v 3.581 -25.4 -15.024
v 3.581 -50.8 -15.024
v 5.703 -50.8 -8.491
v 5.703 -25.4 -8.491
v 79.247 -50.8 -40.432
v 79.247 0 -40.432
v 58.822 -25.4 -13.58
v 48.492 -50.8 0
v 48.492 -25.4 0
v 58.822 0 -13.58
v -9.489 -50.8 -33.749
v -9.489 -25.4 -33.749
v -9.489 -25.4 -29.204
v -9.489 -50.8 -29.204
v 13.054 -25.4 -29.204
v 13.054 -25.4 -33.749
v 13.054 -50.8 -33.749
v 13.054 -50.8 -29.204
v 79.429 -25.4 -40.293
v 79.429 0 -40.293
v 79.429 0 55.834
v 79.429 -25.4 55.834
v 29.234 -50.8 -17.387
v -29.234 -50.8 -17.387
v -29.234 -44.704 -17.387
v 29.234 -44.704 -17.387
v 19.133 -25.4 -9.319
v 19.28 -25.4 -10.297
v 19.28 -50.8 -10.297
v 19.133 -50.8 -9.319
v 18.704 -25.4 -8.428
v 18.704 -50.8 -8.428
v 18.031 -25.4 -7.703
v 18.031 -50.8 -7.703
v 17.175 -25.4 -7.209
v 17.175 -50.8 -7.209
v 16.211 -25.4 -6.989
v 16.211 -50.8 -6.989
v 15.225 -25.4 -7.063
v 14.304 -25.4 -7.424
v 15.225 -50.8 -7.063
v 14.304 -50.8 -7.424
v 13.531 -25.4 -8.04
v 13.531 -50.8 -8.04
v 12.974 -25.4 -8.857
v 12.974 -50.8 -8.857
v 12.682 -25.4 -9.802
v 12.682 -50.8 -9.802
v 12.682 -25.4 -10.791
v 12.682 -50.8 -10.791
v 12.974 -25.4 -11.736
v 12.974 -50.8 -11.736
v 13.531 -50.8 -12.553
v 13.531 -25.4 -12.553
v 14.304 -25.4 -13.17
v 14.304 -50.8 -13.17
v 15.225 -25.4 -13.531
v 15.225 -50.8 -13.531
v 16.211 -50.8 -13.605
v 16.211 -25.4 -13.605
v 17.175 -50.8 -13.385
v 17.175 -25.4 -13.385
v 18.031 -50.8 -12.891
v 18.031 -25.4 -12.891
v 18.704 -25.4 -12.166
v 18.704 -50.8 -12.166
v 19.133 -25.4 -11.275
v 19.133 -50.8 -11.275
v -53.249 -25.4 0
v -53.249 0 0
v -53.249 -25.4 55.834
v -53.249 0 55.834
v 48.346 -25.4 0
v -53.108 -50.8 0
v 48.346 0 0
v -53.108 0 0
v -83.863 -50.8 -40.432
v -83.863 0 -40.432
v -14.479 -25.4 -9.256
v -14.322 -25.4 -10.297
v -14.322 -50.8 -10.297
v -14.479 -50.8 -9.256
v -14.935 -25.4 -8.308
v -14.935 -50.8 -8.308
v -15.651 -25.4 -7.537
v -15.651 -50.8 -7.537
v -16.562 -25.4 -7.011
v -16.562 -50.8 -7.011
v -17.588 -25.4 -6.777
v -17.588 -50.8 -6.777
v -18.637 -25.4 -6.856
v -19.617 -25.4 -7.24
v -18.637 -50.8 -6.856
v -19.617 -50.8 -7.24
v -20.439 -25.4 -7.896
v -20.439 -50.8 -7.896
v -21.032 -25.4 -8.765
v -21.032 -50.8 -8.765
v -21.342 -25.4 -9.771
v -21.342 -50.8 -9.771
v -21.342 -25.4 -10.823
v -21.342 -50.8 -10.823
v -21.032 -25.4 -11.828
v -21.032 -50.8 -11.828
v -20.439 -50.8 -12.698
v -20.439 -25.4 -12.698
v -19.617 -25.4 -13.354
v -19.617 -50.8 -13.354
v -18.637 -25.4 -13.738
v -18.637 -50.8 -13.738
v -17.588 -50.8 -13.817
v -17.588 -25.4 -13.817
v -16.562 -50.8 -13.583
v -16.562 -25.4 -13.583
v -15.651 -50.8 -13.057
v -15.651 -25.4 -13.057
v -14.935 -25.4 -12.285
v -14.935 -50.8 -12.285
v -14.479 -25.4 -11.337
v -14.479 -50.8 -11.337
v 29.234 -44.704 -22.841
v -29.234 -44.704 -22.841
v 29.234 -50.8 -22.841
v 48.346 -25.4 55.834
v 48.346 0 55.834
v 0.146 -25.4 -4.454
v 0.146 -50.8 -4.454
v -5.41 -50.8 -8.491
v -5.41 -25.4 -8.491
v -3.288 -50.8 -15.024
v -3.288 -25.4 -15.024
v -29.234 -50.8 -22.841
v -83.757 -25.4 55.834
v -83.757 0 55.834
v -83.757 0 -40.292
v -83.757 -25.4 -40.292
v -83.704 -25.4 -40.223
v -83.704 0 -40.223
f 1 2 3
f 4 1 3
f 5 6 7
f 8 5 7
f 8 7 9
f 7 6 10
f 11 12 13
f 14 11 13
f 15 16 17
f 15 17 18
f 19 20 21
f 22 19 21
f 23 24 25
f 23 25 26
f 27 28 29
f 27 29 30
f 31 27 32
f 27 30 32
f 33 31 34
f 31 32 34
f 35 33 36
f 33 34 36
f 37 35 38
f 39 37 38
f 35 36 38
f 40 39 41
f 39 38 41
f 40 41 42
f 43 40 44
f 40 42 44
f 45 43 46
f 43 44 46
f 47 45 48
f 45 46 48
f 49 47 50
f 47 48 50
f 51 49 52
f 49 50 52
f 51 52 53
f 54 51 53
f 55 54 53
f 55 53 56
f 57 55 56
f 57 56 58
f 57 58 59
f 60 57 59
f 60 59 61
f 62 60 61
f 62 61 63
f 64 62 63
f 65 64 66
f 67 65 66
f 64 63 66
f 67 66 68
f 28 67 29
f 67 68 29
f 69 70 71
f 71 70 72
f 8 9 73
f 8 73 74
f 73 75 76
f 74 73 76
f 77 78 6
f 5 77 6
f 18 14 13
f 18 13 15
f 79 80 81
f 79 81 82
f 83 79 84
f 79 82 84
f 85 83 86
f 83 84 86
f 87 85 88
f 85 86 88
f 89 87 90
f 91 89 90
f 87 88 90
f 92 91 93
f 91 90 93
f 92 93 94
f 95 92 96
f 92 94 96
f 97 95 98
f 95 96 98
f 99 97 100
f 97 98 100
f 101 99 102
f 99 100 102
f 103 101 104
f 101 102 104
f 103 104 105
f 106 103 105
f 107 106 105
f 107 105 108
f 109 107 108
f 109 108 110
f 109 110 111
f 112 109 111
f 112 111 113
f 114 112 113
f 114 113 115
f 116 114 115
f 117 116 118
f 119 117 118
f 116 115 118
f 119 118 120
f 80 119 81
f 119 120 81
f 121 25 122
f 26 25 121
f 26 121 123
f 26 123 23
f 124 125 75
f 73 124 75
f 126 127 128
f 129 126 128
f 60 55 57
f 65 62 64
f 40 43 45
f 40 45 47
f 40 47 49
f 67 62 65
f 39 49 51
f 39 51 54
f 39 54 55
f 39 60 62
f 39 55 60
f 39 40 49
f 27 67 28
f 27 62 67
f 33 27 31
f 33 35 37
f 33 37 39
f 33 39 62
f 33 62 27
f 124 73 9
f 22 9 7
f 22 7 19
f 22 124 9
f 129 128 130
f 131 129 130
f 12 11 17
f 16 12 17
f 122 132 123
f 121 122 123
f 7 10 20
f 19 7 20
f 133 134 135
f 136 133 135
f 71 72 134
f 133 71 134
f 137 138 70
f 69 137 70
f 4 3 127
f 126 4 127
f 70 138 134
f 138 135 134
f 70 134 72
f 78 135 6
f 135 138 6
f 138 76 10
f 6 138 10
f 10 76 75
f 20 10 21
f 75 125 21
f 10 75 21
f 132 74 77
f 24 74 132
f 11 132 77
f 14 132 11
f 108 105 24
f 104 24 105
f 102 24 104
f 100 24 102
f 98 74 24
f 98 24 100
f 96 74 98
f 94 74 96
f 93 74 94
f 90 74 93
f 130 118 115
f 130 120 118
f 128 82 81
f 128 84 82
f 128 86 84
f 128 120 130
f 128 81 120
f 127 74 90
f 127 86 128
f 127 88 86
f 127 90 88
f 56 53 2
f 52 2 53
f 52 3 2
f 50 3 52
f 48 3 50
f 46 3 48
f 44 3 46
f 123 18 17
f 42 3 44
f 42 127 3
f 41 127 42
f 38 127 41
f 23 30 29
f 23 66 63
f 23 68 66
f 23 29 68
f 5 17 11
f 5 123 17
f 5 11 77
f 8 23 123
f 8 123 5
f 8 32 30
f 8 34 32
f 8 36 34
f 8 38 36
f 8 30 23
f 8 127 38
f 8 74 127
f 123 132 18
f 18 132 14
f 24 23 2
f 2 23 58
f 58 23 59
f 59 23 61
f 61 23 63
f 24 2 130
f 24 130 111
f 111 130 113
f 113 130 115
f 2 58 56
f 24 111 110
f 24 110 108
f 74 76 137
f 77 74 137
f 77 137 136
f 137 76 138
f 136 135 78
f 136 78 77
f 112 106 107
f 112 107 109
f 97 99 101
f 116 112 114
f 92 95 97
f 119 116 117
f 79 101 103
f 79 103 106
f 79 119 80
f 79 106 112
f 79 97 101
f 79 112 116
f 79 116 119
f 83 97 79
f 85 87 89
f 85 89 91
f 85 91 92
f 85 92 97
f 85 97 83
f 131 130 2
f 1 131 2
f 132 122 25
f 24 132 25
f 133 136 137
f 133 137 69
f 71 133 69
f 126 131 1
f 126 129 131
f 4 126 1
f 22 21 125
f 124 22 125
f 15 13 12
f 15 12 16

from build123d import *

# Parameters (mm, degrees)
F1_DEPTH = 50.8
F3_DEPTH = 25.4
F4_W     = 58.468216
F4_H     = 5.453941
F5_DEPTH = 6.096
F6_R     = 4.379023
F6_R_2   = 1.790502
F6_R_3   = 1.715079
F6_R_4   = 3.973674
F6_W     = 7.999114
F6_H     = 1.817981
F6_W_2   = 9.089913
F7_DEPTH = 23.114
F8_R     = 3.529881
F8_R_2   = 3.317504
F8_W     = 22.542965
F8_H     = 4.544951
F9_DEPTH = 25.4


with BuildPart() as f1:
    # F0 (on Front) → F1 (new body)
    with BuildSketch(Plane.XZ):
        Polygon((48.492239, 0), (-53.107761, 0), (-83.862998, -40.432109), (79.247475, -40.432109), align=None)
    extrude(amount=F1_DEPTH)

    # F2 (on Front) → F3 (join)
    with BuildSketch(Plane.XZ):
        Polygon((-83.75679, -40.292807), (-53.249381, 0), (-53.249381, 55.834316), (-83.75679, 55.834316), align=None)
        Polygon((48.34605, 55.834316), (48.34605, 0), (79.429068, -40.292807), (79.429068, 55.834316), align=None)
    extrude(amount=F3_DEPTH)

    # F4 (on face) → F5 (cut)
    with BuildSketch(Plane.XZ.offset(50.8)):
        with Locations((0, -20.114008)):
            Rectangle(F4_W, F4_H)
    extrude(amount=-F5_DEPTH, mode=Mode.SUBTRACT)

    # F6 (on face) → F7 (join)
    with BuildSketch(Plane.XZ.offset(50.8)):
        with Locations((0, -32.47628)):
            Circle(F6_R)
        with Locations((10.145307, -32.112684)):
            Circle(F6_R_2)
        with Locations((-9.670687, -32.294482)):
            Circle(F6_R_3)
        with Locations((0, -10.660506)):
            Circle(F6_R_4)
        with Locations((-18.396996, -11.569497)):
            Rectangle(F6_W, F6_H)
        with Locations((16.690036, -11.569497)):
            Rectangle(F6_W_2, F6_H)
    extrude(amount=-F7_DEPTH)

    # F8 (on face) → F9 (cut)
    with BuildSketch(Plane.XZ.offset(50.8)):
        Polygon((-3.287774, -15.02366), (3.580596, -15.02366), (5.703039, -8.491452), (0.146411, -4.454326), (-5.410217, -8.491452), align=None)
        with Locations((-17.851602, -10.29691)):
            Circle(F8_R)
        with Locations((15.962845, -10.29691)):
            Circle(F8_R_2)
        with Locations((1.782593, -31.476389)):
            Rectangle(F8_W, F8_H)
    extrude(amount=-F9_DEPTH, mode=Mode.SUBTRACT)


solid = f1.part
